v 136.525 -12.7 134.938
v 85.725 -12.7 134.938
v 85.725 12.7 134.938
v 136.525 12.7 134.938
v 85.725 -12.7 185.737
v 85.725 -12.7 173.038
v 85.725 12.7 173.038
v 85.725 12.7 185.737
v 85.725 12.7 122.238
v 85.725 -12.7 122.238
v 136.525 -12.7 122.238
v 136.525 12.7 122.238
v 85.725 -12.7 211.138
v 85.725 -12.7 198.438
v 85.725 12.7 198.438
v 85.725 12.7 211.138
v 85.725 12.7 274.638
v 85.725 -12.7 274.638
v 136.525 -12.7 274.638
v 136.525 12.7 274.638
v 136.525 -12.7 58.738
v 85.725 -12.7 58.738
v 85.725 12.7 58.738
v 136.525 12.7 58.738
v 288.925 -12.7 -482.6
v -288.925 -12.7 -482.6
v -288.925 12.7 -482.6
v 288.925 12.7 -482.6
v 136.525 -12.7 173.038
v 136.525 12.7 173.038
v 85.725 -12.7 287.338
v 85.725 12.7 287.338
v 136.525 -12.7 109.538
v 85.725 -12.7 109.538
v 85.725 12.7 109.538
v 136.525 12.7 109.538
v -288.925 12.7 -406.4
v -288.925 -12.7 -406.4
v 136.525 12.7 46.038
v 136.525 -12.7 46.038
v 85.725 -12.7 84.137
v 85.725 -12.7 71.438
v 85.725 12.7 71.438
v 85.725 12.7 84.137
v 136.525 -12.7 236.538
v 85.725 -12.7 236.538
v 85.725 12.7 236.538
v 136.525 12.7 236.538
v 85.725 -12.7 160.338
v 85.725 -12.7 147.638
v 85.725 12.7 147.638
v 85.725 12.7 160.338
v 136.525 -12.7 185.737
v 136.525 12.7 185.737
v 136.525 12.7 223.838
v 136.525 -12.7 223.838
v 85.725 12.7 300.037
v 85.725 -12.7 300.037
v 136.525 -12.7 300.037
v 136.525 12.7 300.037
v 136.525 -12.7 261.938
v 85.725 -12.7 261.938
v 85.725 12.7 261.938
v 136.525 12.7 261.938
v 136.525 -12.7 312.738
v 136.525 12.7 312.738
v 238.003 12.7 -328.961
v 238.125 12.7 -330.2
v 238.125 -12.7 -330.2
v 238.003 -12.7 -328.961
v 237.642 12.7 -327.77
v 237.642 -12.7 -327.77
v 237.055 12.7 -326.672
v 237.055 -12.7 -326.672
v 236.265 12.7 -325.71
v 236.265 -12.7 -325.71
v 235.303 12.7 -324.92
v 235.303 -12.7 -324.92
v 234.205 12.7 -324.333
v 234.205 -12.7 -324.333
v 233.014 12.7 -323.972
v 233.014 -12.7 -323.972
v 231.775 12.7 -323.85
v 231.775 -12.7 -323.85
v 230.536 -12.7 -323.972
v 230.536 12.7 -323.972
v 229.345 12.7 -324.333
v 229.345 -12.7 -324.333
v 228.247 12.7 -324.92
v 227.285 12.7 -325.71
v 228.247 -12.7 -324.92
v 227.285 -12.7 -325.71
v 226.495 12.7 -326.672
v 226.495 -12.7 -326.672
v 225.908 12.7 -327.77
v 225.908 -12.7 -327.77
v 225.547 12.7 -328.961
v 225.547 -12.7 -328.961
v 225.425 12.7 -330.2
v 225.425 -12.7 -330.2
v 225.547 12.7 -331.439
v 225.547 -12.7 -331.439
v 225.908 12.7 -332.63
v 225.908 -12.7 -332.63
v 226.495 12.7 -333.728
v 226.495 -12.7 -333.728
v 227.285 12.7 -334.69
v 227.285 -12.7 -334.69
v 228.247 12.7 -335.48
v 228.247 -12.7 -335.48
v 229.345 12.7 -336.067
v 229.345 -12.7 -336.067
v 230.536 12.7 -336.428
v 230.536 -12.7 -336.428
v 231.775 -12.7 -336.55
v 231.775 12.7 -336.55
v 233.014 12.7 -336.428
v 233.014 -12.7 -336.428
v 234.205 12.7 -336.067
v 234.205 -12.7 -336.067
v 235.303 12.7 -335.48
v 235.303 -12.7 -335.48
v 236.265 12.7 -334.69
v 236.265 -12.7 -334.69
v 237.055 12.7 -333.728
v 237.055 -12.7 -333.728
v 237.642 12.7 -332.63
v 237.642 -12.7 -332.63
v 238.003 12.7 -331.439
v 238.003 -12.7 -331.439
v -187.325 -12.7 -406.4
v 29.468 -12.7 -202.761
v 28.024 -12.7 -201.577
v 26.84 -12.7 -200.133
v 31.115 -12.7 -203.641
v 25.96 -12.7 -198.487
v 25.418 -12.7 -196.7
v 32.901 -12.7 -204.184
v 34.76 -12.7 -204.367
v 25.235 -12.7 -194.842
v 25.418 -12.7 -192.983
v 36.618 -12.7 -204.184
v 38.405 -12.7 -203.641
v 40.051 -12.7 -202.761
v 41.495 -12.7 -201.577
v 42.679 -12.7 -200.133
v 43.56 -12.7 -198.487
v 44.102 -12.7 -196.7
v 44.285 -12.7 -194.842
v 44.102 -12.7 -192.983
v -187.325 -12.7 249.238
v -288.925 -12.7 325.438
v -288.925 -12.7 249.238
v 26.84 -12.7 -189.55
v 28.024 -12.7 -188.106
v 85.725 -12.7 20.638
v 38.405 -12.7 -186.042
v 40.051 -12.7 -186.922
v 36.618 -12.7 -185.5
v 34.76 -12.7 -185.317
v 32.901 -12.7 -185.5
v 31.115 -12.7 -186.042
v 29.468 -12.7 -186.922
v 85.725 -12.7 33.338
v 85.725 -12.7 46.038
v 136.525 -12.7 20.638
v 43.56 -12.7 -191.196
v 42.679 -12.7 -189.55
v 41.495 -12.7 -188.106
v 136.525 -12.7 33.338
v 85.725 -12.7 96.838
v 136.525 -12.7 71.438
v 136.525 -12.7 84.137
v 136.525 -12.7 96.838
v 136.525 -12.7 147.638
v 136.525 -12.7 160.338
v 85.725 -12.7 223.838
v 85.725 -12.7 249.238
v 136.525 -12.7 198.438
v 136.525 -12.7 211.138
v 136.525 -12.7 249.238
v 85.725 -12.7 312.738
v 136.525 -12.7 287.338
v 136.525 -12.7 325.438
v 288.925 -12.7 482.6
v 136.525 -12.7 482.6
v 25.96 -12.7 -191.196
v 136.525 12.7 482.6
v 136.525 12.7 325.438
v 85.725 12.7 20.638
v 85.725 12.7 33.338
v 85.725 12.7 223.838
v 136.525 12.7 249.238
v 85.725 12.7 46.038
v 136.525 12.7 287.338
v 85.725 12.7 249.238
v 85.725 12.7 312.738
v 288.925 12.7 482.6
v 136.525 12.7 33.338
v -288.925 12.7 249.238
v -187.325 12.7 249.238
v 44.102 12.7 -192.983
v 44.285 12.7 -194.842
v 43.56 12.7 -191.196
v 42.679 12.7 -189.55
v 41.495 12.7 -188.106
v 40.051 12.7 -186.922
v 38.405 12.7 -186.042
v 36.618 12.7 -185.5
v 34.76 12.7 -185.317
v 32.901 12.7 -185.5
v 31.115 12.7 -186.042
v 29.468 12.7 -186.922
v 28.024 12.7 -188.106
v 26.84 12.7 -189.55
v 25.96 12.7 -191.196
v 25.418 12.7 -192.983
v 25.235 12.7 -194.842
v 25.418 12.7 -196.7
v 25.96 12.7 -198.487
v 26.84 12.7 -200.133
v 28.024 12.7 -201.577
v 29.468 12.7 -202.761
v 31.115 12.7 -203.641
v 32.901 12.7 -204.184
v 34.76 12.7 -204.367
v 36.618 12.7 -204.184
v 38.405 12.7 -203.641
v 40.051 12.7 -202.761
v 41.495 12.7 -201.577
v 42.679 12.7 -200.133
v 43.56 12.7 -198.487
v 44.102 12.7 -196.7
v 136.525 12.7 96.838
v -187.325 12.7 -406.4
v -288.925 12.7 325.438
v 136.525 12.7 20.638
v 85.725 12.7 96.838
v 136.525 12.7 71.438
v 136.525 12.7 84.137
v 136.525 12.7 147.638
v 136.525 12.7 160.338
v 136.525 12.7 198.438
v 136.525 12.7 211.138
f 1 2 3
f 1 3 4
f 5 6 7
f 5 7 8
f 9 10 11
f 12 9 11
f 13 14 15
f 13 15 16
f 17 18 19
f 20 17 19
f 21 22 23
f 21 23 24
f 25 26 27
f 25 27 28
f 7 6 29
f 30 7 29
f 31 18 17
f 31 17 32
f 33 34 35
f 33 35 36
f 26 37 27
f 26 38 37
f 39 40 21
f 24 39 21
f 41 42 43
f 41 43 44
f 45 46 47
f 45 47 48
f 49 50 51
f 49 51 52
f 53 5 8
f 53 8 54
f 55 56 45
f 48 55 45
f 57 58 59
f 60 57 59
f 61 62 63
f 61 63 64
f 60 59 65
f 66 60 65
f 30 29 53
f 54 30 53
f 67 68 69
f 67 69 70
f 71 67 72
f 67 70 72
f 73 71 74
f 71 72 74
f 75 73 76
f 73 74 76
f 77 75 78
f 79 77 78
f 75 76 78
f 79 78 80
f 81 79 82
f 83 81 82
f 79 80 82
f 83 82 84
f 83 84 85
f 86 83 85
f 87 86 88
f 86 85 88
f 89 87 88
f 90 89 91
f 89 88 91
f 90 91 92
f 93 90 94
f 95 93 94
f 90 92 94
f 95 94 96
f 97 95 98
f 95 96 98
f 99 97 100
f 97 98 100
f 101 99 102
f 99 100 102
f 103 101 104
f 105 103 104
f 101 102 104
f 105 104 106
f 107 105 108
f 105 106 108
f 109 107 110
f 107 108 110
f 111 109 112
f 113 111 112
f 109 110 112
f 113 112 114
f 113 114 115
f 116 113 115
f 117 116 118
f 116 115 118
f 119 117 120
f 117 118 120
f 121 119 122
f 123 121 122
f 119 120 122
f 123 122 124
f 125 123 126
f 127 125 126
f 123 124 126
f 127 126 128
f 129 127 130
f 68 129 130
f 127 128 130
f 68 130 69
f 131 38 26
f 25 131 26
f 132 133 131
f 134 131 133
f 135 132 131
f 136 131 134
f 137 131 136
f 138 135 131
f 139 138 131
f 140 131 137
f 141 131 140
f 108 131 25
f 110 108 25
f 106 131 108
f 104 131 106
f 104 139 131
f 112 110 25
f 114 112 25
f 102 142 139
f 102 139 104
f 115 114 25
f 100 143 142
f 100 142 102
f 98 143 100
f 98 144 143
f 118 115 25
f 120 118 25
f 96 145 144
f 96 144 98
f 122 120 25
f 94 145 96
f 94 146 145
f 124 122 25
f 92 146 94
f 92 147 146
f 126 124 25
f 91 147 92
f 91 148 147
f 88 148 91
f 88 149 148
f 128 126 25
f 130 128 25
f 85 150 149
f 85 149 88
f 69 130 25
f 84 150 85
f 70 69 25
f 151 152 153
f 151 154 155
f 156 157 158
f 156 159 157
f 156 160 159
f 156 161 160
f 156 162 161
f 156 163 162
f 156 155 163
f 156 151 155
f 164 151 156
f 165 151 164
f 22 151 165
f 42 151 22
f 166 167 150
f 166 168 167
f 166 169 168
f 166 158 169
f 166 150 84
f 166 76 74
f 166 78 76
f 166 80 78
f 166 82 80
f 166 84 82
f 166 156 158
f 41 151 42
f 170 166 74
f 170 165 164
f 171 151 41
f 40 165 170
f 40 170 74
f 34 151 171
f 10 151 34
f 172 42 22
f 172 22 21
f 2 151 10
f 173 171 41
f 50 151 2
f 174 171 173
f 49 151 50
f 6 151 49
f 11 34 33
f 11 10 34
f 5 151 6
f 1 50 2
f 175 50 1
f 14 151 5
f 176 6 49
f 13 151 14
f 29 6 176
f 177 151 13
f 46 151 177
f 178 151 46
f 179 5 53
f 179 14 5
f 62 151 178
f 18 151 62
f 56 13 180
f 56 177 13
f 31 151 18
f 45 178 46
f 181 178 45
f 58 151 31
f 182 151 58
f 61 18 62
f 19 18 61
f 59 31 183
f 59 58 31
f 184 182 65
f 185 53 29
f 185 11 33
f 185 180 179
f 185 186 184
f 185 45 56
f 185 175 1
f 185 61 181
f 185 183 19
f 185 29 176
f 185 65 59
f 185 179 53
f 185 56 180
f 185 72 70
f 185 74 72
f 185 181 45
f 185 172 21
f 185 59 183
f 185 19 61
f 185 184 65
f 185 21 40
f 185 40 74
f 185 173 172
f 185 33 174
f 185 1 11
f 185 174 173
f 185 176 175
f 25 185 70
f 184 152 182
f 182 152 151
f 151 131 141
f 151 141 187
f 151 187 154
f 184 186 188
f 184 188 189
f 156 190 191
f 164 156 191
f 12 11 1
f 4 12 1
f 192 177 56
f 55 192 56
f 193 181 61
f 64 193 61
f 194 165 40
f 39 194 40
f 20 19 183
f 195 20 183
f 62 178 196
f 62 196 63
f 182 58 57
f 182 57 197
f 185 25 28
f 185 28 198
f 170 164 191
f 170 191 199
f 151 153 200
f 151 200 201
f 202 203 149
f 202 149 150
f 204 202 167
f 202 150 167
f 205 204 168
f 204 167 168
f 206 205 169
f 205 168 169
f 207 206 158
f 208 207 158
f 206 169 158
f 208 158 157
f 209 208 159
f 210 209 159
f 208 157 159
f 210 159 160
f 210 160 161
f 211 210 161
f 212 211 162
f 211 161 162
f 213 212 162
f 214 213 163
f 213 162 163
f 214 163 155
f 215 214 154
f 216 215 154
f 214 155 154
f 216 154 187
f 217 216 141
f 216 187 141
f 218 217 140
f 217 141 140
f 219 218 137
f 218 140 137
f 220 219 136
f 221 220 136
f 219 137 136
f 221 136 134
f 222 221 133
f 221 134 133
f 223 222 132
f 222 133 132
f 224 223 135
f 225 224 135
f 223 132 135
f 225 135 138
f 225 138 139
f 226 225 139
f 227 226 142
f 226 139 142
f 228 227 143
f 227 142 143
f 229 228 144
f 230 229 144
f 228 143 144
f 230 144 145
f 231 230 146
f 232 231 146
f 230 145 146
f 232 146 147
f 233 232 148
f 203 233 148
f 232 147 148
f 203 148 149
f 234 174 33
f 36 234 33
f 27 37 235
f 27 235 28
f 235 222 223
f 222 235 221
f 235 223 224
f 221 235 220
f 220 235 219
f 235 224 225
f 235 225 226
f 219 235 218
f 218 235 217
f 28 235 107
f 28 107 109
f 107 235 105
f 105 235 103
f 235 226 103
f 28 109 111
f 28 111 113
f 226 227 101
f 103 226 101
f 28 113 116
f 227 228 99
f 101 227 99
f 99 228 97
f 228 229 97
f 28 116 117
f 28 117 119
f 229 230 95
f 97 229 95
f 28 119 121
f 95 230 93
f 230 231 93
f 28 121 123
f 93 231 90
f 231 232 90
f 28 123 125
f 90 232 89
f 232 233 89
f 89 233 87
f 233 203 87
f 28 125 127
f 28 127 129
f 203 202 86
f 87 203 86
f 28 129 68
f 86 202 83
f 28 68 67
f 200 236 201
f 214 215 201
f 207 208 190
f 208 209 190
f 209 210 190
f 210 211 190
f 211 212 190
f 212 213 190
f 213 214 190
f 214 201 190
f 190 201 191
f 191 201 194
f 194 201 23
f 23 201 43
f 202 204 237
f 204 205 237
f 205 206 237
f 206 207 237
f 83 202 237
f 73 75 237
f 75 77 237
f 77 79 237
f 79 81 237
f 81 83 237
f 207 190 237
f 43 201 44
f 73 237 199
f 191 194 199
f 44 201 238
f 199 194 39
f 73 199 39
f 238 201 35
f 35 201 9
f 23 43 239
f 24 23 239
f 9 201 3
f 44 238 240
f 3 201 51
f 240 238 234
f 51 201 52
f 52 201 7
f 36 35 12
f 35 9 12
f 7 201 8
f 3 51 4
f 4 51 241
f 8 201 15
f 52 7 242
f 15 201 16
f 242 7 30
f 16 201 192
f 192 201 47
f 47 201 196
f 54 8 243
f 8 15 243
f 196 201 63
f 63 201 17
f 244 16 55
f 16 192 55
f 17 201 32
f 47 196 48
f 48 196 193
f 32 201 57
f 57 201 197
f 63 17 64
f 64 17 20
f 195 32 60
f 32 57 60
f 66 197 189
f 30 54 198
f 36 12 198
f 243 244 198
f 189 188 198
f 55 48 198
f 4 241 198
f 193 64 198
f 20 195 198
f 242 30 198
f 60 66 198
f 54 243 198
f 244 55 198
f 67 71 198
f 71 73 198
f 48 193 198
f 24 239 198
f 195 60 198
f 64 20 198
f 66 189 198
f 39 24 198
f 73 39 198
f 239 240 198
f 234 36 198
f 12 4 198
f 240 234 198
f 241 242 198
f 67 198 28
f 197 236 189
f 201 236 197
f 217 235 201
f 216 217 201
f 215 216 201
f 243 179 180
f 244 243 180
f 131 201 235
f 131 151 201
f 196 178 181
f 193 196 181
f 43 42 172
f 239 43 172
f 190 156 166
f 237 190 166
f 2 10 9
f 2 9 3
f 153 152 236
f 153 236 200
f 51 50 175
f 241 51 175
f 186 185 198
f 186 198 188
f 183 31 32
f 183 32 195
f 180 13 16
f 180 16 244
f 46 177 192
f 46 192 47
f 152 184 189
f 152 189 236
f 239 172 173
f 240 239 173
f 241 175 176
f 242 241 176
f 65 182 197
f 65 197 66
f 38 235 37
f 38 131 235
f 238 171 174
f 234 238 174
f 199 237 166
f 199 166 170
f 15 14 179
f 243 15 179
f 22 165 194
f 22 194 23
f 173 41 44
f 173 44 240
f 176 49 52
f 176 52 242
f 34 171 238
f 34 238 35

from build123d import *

# Parameters (mm, degrees)
F1_DEPTH = 12.7
F2_R     = 6.35
F3_DEPTH = 25.4
F4_R     = 9.525
F5_DEPTH = 25.4
F6_W     = 50.8
F6_H     = 12.7
F7_DEPTH = 25.4


with BuildPart() as f1:
    # F0 (on Front) → F1 (new body, symmetric)
    with BuildSketch(Plane.XZ):
        Polygon((-288.925, -406.4), (-288.925, -482.6), (288.925, -482.6), (288.925, 482.6), (136.525, 482.6), (136.525, 325.4375), (-288.925, 325.4375), (-288.925, 249.2375), (-187.325, 249.2375), (-187.325, -406.4), align=None)
    extrude(amount=F1_DEPTH, both=True)

    # F2 (on face) → F3 (cut)
    with BuildSketch(Plane.XZ.offset(12.7)):
        with Locations((231.775, -330.2)):
            Circle(F2_R)
    extrude(amount=-F3_DEPTH, mode=Mode.SUBTRACT)

    # F4 (on face) → F5 (cut)
    with BuildSketch(Plane.XZ.offset(12.7)):
        with Locations((34.759605, -194.841525)):
            Circle(F4_R)
    extrude(amount=-F5_DEPTH, mode=Mode.SUBTRACT)

    # F6 (on face) → F7 (cut)
    with BuildSketch(Plane.XZ.offset(12.7)):
        with Locations((111.125, 306.3875)):
            Rectangle(F6_W, F6_H)
        with Locations((111.125, 280.9875)):
            Rectangle(F6_W, F6_H)
        with Locations((111.125, 255.5875)):
            Rectangle(F6_W, F6_H)
        with Locations((111.125, 230.1875)):
            Rectangle(F6_W, F6_H)
        with Locations((111.125, 204.7875)):
            Rectangle(F6_W, F6_H)
        with Locations((111.125, 179.3875)):
            Rectangle(F6_W, F6_H)
        with Locations((111.125, 153.9875)):
            Rectangle(F6_W, F6_H)
        with Locations((111.125, 128.5875)):
            Rectangle(F6_W, F6_H)
        with Locations((111.125, 103.1875)):
            Rectangle(F6_W, F6_H)
        with Locations((111.125, 77.7875)):
            Rectangle(F6_W, F6_H)
        with Locations((111.125, 52.3875)):
            Rectangle(F6_W, F6_H)
        with Locations((111.125, 26.9875)):
            Rectangle(F6_W, F6_H)
    extrude(amount=-F7_DEPTH, mode=Mode.SUBTRACT)


solid = f1.part
